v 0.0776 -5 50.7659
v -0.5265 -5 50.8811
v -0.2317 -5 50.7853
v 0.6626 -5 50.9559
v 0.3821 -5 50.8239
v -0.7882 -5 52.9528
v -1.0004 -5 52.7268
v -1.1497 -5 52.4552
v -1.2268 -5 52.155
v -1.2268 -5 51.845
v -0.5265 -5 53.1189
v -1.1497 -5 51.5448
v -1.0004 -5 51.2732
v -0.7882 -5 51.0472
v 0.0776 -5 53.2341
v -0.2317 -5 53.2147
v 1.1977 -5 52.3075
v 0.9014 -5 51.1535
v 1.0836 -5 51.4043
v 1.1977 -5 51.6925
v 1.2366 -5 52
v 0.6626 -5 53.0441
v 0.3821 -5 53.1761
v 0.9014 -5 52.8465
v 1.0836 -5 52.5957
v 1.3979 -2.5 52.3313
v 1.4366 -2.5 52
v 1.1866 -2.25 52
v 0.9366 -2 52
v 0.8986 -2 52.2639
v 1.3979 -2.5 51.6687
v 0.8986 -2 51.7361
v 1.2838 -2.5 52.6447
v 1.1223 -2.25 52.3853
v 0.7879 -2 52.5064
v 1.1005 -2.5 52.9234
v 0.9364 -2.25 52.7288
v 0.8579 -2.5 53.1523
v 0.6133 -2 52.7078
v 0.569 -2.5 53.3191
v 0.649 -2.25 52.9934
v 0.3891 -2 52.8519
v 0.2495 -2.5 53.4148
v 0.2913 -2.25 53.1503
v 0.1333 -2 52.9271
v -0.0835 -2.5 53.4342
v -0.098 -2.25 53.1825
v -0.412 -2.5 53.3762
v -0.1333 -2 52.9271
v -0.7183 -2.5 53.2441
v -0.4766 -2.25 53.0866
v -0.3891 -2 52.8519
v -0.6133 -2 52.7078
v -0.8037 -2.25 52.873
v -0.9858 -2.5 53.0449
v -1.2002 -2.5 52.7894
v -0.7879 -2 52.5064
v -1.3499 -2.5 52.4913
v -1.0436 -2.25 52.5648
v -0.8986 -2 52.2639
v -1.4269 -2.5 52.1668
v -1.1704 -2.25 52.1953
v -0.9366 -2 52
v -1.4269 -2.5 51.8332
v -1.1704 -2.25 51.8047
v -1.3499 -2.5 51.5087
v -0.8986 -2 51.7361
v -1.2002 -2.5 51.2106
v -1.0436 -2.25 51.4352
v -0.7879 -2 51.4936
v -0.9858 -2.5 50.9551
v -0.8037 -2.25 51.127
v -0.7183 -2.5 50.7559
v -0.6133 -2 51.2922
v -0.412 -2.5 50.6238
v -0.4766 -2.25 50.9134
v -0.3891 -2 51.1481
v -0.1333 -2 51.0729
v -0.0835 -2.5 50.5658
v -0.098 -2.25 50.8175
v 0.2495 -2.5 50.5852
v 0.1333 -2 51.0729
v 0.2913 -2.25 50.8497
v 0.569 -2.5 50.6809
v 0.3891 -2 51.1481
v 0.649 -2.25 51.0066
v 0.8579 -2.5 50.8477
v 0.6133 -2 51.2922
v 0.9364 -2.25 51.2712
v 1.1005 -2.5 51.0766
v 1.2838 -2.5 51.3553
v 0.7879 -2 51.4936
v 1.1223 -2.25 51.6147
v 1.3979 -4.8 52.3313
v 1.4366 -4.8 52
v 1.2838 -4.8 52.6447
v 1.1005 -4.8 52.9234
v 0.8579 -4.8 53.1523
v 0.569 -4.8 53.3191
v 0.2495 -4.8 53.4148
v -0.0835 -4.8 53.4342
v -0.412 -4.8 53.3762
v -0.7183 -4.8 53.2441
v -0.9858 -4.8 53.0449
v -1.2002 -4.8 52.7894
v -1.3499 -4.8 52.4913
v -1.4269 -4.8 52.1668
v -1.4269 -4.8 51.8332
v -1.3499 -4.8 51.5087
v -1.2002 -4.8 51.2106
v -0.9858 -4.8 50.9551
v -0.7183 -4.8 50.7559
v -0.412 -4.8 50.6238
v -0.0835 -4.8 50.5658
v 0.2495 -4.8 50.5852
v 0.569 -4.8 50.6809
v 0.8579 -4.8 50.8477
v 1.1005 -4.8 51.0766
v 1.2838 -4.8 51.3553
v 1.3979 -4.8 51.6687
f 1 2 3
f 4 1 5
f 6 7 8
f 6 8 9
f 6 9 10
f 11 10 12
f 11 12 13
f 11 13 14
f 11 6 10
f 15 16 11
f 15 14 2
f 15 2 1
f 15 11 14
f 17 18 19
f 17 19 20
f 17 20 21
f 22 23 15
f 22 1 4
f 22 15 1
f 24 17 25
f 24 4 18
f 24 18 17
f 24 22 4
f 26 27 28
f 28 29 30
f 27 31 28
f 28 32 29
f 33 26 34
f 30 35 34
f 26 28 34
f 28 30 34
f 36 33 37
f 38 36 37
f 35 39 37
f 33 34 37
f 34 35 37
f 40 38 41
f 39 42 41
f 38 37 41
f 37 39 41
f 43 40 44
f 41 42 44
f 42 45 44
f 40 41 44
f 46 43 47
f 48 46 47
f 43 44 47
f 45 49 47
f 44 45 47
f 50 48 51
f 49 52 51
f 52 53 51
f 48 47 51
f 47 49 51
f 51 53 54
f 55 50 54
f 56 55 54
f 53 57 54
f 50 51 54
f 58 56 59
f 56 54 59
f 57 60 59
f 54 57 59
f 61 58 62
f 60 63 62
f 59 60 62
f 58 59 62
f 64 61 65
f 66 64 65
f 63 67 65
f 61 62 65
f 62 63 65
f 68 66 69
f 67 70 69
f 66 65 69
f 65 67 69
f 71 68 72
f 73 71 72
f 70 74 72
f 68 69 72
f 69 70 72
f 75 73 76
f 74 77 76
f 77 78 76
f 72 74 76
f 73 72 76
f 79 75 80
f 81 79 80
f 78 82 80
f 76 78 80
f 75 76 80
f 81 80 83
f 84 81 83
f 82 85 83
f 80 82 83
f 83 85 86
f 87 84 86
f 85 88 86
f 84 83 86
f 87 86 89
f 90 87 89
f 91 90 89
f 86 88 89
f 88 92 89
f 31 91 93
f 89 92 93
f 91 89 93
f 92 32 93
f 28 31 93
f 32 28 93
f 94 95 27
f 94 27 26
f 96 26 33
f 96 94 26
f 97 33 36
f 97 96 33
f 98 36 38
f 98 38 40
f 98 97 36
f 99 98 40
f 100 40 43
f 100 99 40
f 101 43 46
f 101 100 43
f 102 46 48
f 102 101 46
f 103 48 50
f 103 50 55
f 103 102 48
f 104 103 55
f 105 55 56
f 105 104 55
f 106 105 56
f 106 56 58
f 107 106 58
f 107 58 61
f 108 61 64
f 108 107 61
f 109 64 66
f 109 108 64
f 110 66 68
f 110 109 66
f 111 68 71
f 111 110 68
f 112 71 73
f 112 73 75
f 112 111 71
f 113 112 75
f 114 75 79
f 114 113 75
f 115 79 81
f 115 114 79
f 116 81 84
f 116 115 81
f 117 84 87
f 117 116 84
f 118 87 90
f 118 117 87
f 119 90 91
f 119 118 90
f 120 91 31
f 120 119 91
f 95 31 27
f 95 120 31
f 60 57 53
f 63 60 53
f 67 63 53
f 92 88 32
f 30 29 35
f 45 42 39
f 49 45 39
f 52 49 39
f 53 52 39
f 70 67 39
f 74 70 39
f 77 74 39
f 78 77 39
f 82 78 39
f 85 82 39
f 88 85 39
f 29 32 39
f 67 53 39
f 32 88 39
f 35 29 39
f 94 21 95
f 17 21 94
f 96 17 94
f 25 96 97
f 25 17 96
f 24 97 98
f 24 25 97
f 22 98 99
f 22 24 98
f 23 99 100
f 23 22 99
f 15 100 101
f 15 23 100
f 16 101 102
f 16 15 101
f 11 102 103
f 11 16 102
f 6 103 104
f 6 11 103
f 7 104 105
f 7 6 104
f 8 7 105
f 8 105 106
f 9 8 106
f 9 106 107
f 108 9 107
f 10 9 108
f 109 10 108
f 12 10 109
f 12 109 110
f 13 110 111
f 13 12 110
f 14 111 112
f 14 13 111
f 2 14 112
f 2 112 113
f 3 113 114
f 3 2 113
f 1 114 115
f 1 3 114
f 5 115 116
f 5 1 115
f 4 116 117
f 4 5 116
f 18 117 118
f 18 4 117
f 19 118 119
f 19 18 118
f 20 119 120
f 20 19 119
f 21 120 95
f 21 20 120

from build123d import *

# Parameters (mm, degrees)
SKETCH014_R     = 1.436584
PAD008_DEPTH    = 3
CHAMFER003_SIZE = 0.5
CHAMFER004_SIZE = 0.2


with BuildPart() as part:
    # Sketch014 → Pad008 (new body)
    with BuildSketch(Plane(origin=(0, -5, 52), x_dir=(1, 0, 0), z_dir=(0, -1, 0))):
        Circle(SKETCH014_R)
    extrude(amount=-PAD008_DEPTH)

    # Chamfer003
    chamfer003_edges = [part.edges().sort_by_distance(p)[0] for p in [
        (-1.436584, -2, 52),
    ]]
    chamfer(chamfer003_edges, length=CHAMFER003_SIZE)

    # Chamfer004
    chamfer004_edges = [part.edges().sort_by_distance(p)[0] for p in [
        (-1.436584, -5, 52),
    ]]
    chamfer(chamfer004_edges, length=CHAMFER004_SIZE)


solid = part.part
